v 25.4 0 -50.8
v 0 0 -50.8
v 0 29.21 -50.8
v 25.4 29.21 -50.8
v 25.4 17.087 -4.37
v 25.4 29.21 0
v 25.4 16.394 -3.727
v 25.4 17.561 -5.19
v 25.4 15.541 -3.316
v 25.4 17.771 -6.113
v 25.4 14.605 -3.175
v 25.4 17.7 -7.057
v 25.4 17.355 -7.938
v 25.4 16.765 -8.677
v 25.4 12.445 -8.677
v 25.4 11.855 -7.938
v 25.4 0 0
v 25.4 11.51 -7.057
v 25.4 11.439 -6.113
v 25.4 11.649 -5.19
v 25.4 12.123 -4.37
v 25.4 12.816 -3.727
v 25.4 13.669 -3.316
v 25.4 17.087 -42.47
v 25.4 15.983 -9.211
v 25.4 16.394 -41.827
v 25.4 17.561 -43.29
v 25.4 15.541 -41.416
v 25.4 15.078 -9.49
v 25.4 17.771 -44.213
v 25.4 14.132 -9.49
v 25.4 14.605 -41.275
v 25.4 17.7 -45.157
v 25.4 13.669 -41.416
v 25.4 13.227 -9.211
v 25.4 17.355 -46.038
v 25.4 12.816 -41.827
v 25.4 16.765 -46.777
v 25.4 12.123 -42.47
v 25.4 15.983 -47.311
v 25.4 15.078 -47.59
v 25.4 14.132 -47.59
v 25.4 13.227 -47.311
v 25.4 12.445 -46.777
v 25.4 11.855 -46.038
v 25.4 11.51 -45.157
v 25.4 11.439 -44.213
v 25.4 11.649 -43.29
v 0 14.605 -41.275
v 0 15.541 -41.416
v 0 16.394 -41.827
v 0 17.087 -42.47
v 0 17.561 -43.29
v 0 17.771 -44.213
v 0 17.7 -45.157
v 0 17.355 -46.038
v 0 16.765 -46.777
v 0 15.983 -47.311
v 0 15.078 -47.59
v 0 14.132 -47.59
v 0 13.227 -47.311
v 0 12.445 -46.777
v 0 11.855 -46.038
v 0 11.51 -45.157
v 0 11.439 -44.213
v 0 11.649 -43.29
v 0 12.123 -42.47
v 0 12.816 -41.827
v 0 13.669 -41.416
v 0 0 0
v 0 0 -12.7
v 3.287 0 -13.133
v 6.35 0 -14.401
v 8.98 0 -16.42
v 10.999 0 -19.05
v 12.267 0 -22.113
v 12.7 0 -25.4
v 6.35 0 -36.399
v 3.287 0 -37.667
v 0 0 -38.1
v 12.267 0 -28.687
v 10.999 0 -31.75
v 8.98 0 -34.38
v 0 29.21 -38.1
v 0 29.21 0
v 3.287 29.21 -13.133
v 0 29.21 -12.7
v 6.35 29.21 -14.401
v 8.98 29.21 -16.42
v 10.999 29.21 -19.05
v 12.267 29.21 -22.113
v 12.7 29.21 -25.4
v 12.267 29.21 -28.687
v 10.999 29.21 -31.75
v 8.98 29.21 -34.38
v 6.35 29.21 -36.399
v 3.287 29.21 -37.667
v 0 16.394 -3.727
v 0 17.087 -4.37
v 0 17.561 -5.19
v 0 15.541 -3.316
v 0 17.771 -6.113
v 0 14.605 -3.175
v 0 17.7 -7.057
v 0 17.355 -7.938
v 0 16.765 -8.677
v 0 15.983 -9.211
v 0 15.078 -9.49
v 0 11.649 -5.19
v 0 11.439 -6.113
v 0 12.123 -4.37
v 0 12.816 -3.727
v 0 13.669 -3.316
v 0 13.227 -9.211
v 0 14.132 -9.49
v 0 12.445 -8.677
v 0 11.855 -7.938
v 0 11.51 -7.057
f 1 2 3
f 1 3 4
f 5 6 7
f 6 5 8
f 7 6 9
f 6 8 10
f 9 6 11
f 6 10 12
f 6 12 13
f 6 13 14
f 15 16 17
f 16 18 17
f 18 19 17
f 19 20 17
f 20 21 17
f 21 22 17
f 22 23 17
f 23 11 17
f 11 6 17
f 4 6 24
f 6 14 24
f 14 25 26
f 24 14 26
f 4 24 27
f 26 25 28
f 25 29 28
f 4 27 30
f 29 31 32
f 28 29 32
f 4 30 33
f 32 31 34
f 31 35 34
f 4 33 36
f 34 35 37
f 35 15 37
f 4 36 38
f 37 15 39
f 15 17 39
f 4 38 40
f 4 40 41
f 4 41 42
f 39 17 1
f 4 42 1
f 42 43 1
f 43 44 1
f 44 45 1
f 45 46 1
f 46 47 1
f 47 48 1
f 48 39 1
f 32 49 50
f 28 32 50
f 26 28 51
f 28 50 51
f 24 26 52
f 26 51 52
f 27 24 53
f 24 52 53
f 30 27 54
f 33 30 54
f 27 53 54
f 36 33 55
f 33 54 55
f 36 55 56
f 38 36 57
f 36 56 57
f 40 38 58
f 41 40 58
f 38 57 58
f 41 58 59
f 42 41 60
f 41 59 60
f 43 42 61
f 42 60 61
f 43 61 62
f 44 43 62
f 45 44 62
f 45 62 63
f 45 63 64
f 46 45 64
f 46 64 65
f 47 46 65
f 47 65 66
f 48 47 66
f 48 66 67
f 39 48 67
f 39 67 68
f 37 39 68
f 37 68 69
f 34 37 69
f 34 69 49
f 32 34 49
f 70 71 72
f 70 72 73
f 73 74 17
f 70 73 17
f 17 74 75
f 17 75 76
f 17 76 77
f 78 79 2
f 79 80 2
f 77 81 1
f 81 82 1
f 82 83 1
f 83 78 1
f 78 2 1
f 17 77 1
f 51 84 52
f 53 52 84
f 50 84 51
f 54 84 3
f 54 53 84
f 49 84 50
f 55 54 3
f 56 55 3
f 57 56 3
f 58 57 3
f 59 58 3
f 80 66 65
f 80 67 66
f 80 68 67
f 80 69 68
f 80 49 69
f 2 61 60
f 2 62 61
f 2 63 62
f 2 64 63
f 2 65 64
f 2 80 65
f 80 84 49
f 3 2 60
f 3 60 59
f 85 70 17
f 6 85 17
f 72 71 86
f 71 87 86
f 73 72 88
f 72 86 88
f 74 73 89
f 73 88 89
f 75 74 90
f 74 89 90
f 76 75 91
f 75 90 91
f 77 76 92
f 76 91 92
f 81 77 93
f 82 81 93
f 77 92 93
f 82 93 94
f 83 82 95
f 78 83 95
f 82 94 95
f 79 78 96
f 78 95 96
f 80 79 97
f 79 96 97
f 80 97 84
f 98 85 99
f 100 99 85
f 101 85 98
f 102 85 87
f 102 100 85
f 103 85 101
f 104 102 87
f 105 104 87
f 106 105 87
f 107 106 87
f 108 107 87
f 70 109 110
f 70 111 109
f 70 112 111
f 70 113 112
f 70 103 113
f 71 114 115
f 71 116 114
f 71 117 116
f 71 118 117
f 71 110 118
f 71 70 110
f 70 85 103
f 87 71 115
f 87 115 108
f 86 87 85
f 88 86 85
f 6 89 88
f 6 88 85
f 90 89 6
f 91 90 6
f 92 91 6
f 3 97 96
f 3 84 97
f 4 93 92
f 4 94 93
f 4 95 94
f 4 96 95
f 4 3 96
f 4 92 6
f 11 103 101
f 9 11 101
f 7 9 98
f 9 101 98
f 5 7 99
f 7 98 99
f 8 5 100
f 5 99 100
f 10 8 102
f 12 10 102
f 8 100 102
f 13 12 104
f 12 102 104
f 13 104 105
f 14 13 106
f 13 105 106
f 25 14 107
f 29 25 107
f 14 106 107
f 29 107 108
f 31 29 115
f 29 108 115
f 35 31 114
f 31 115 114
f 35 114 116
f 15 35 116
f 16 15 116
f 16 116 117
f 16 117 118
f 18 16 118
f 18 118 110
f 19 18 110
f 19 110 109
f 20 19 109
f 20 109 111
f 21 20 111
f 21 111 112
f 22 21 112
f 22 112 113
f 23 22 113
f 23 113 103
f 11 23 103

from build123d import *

# Parameters (mm, degrees)
SKETCH1_W           = 25.4
SKETCH1_H           = 50.8
BOSS_EXTRUDE1_DEPTH = 29.21
SKETCH2_R           = 12.7
CUT_EXTRUDE1_DEPTH  = 64.86723808
SKETCH4_R           = 3.175
CUT_EXTRUDE2_DEPTH  = 64.86723808
SKETCH5_R           = 3.175
CUT_EXTRUDE3_DEPTH  = 64.86723808


with BuildPart() as part:
    # Sketch1 → Boss-Extrude1 (new body)
    with BuildSketch(Plane(origin=(0, 0, 0), x_dir=(1, 0, 0), z_dir=(0, 1, 0))):
        with Locations((12.7, 25.4)):
            Rectangle(SKETCH1_W, SKETCH1_H)
    extrude(amount=BOSS_EXTRUDE1_DEPTH)

    # Sketch2 → Cut-Extrude1 (cut, through all)
    with BuildSketch(Plane(origin=(0, 29.21, 0), x_dir=(1, 0, 0), z_dir=(0, 1, 0))):
        with Locations((0, 25.4)):
            Circle(SKETCH2_R)
    extrude(amount=-CUT_EXTRUDE1_DEPTH, mode=Mode.SUBTRACT)

    # Sketch4 → Cut-Extrude2 (cut, through all)
    with BuildSketch(Plane.ZY):
        with Locations((-44.45, 14.605)):
            Circle(SKETCH4_R)
    extrude(amount=-CUT_EXTRUDE2_DEPTH, mode=Mode.SUBTRACT)

    # Sketch5 → Cut-Extrude3 (cut, through all)
    with BuildSketch(Plane.ZY):
        with Locations((-6.35, 14.605)):
            Circle(SKETCH5_R)
    extrude(amount=-CUT_EXTRUDE3_DEPTH, mode=Mode.SUBTRACT)


solid = part.part
